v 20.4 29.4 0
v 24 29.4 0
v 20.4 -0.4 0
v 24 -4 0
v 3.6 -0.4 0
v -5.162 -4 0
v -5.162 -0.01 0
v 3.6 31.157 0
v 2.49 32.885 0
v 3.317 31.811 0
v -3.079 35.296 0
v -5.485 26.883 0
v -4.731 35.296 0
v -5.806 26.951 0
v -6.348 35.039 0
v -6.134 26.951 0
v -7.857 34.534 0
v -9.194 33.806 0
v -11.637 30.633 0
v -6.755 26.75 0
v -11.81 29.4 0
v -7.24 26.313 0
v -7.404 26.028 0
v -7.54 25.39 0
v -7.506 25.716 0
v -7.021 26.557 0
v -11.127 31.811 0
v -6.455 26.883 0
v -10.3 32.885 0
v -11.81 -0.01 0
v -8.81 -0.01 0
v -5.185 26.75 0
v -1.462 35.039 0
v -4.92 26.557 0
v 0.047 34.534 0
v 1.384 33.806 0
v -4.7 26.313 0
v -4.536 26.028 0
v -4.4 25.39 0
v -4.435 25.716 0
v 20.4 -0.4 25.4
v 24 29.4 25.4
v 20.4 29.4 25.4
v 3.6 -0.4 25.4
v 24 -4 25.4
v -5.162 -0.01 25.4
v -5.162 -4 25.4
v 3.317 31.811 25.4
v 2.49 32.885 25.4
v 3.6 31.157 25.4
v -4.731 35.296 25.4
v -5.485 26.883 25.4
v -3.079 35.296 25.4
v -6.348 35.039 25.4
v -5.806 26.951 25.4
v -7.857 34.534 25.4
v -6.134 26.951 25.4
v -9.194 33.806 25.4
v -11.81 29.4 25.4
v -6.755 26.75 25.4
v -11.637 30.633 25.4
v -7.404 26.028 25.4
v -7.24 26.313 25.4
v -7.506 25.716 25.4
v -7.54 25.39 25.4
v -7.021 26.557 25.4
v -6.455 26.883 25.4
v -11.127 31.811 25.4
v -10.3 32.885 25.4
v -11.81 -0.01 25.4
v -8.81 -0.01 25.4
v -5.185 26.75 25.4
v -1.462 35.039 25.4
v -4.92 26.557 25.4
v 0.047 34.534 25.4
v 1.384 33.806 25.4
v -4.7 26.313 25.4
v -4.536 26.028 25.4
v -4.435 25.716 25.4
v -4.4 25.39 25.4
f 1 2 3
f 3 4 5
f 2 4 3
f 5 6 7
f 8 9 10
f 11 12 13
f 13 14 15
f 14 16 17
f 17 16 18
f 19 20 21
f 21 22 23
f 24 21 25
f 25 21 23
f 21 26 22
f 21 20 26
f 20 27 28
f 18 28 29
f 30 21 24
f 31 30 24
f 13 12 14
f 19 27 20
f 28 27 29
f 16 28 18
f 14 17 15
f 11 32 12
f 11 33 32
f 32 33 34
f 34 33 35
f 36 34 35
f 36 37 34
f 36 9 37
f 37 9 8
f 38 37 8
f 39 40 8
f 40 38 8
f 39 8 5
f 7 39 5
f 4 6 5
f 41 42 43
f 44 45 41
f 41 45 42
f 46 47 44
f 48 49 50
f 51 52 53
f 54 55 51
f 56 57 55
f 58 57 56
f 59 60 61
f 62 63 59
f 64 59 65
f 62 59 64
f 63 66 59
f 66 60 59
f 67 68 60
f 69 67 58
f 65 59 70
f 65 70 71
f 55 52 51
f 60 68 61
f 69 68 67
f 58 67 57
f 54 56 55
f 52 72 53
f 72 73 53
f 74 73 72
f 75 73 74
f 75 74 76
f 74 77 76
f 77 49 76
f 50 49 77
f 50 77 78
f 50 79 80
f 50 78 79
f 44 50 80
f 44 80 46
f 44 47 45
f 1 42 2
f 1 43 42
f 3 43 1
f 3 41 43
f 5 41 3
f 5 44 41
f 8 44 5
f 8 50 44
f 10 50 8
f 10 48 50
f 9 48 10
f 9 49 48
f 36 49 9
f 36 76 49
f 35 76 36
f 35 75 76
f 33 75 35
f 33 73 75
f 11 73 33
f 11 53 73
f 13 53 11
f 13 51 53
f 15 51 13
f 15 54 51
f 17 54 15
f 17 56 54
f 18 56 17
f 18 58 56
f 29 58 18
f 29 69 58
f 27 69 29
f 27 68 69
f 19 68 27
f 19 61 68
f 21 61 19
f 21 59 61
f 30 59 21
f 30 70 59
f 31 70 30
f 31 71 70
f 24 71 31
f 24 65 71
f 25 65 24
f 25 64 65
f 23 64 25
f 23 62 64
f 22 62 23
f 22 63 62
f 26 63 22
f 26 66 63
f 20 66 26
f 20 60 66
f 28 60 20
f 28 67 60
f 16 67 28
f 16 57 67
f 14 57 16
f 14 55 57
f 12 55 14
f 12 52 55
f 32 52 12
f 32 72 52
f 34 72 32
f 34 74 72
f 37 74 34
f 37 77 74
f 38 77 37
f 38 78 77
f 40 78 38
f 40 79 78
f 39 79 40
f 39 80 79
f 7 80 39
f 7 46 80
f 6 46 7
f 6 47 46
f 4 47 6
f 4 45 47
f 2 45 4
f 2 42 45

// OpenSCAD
//
// Copyright (C) 2017, Jason S. McMullan <jason.mcmullan@gmail.com>
// All rights reserved.
//
// Licensed under the MIT License:
//
// Permission is hereby granted, free of charge, to any person obtaining
// a copy of this software and associated documentation files (the "Software"),
// to deal in the Software without restriction, including without limitation
// the rights to use, copy, modify, merge, publish, distribute, sublicense,
// and/or sell copies of the Software, and to permit persons to whom the
// Software is furnished to do so, subject to the following conditions:
//
// The above copyright notice and this permission notice shall be included
// in all copies or substantial portions of the Software.
//
// THE SOFTWARE IS PROVIDED "AS IS", WITHOUT WARRANTY OF ANY KIND, EXPRESS OR
// IMPLIED, INCLUDING BUT NOT LIMITED TO THE WARRANTIES OF MERCHANTABILITY,
// FITNESS FOR A PARTICULAR PURPOSE AND NONINFRINGEMENT. IN NO EVENT SHALL THE
// AUTHORS OR COPYRIGHT HOLDERS BE LIABLE FOR ANY CLAIM, DAMAGES OR OTHER
// LIABILITY, WHETHER IN AN ACTION OF CONTRACT, TORT OR OTHERWISE, ARISING
// FROM, OUT OF OR IN CONNECTION WITH THE SOFTWARE OR THE USE OR OTHER
// DEALINGS IN THE SOFTWARE.
//

inch = 25.4;

mdf_width = 16;
mdf_length = 405;
mdf_tolerance = 0.2*2;

clip_tolerance = 0.2*3;

// Wall size (structural)
wall = 4;

module scanner_clip_cut()
{
    scale([inch, inch]) {
        polygon([[0,0],[-100,-0],[-100,-100],[0.12 + clip_tolerance/inch,-100],[0.12+clip_tolerance/inch,0],[0.15+clip_tolerance/inch,1], [0.05, 1]]);
        translate([0.1 + clip_tolerance/inch/2, 1]) circle(d=0.1 + clip_tolerance/inch, $fn=30);
    }
}

module mdf_cut()
{
   translate([-mdf_tolerance, -mdf_tolerance])
        square([mdf_width + mdf_tolerance*2, 100]);
}

module scrappy_z_clip(h=1*inch)
{
    linear_extrude(height=h) difference()
    {
        union()
        {
            translate([-wall-0.15*inch-wall, -wall])
                square([wall+0.15*inch+wall+wall+mdf_width+wall, wall+1*inch+wall]);
            translate([-0.15*inch/2-wall*0.5, 1*inch+wall])
                scale([1, 0.75]) circle(d=0.15*inch+wall*3, $fn=30);
        }
        translate([-0.15*inch-wall*1.25, -0.01])
            scanner_clip_cut();
        translate([wall, 0])
            mdf_cut();
    }
}

scrappy_z_clip(h=1*inch);

// vim: set shiftwidth=4 expandtab: //
